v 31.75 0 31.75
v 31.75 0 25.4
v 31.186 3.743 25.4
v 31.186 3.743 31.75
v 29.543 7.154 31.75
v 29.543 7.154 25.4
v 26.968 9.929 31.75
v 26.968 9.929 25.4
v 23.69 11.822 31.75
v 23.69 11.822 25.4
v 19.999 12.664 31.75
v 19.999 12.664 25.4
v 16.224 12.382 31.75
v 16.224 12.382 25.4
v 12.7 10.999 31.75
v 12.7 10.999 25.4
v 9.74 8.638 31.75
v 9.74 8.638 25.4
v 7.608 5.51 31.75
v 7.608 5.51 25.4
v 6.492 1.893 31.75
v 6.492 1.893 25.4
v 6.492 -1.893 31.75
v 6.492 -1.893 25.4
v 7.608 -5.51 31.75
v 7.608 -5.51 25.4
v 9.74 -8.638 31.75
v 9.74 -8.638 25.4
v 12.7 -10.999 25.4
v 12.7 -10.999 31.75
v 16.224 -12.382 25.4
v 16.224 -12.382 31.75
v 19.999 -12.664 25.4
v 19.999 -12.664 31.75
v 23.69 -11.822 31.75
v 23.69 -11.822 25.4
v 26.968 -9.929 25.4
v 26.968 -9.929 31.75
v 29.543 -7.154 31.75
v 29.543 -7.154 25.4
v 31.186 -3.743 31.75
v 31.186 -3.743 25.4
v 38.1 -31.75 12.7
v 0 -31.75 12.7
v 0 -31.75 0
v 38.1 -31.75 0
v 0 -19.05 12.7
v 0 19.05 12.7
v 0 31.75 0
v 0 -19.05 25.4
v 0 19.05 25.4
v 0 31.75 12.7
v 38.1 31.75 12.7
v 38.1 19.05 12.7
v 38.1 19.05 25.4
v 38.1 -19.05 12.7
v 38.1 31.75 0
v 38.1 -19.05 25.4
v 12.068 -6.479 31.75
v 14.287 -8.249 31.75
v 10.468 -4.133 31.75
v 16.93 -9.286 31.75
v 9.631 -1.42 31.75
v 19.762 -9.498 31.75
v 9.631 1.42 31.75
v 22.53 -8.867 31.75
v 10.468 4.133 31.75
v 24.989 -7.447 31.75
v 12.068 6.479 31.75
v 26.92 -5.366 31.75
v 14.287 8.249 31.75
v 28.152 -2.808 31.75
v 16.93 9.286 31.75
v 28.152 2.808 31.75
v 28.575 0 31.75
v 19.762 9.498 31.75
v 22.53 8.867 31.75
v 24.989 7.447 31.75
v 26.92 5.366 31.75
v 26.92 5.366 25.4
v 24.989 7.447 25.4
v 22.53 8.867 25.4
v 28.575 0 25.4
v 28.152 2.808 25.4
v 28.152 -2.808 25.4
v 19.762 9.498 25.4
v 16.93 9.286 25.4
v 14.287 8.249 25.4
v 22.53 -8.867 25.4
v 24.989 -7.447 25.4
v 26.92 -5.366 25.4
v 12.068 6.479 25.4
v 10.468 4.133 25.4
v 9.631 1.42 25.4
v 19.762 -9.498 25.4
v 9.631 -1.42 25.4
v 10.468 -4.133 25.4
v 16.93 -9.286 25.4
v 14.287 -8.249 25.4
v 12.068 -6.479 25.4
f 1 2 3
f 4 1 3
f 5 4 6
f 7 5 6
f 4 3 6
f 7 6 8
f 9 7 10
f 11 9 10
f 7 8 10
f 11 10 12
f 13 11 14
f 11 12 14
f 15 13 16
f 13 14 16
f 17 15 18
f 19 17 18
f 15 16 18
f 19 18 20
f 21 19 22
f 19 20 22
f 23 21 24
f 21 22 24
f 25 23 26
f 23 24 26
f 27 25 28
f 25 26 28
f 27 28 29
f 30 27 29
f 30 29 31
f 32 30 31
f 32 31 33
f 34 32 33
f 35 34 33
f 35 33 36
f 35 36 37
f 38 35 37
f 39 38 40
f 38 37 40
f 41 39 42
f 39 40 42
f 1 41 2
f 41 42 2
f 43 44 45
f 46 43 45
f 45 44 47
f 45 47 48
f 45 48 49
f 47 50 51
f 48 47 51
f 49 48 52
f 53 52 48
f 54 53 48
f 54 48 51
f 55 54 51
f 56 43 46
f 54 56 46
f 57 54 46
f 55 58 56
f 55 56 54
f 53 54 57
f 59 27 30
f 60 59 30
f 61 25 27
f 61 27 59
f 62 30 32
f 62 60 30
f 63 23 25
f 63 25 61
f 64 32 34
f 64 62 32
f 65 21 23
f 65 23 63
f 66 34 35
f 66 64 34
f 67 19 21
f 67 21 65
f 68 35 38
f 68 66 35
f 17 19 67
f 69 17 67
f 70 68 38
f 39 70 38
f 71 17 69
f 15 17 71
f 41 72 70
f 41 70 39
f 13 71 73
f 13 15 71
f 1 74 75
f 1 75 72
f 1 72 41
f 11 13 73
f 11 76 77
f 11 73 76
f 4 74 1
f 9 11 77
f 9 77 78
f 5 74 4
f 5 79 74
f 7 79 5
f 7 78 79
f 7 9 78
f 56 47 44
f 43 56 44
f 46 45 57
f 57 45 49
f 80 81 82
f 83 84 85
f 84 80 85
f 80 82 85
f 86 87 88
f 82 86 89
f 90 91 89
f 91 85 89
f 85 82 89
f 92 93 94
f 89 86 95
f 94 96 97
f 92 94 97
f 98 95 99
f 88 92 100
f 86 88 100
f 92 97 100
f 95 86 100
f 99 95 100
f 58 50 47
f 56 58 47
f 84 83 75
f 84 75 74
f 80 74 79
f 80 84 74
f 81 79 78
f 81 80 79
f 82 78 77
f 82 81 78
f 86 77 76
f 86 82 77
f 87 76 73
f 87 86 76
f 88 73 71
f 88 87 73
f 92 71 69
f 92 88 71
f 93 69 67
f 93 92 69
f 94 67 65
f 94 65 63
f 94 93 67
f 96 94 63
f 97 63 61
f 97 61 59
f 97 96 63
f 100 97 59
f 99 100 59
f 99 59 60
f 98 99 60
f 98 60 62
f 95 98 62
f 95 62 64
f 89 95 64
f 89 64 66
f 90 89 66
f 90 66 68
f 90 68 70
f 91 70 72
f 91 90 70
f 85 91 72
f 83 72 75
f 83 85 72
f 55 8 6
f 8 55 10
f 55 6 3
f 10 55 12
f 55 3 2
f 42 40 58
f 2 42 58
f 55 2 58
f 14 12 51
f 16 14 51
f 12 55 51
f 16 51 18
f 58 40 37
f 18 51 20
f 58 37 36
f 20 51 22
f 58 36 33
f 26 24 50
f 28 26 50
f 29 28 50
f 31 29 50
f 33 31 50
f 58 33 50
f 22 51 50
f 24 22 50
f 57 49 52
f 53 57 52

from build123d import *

# Parameters (mm, degrees)
F1_DEPTH = 38.1
F2_R     = 12.7
F2_R_2   = 9.525
F3_DEPTH = 6.35


# Not quite as in the source:
# - a feature names something its author has since deleted; it is built from what else it names


with BuildPart() as f1:
    # F0 (on Right) → F1 (new body)
    with BuildSketch(Plane.YZ):
        Polygon((-31.75, 0), (0, 0), (31.75, 0), (31.75, 12.7), (19.05, 12.7), (19.05, 25.4), (-19.05, 25.4), (-19.05, 12.7), (-31.75, 12.7), align=None)
    extrude(amount=F1_DEPTH)

    # F2 (on face) → F3 (join)
    with BuildSketch(Plane.XY.offset(25.4)):
        with Locations((19.05, 0)):
            Circle(F2_R)
        with Locations((19.05, 0)):
            Circle(F2_R_2, mode=Mode.SUBTRACT)
    extrude(amount=F3_DEPTH)


solid = f1.part
